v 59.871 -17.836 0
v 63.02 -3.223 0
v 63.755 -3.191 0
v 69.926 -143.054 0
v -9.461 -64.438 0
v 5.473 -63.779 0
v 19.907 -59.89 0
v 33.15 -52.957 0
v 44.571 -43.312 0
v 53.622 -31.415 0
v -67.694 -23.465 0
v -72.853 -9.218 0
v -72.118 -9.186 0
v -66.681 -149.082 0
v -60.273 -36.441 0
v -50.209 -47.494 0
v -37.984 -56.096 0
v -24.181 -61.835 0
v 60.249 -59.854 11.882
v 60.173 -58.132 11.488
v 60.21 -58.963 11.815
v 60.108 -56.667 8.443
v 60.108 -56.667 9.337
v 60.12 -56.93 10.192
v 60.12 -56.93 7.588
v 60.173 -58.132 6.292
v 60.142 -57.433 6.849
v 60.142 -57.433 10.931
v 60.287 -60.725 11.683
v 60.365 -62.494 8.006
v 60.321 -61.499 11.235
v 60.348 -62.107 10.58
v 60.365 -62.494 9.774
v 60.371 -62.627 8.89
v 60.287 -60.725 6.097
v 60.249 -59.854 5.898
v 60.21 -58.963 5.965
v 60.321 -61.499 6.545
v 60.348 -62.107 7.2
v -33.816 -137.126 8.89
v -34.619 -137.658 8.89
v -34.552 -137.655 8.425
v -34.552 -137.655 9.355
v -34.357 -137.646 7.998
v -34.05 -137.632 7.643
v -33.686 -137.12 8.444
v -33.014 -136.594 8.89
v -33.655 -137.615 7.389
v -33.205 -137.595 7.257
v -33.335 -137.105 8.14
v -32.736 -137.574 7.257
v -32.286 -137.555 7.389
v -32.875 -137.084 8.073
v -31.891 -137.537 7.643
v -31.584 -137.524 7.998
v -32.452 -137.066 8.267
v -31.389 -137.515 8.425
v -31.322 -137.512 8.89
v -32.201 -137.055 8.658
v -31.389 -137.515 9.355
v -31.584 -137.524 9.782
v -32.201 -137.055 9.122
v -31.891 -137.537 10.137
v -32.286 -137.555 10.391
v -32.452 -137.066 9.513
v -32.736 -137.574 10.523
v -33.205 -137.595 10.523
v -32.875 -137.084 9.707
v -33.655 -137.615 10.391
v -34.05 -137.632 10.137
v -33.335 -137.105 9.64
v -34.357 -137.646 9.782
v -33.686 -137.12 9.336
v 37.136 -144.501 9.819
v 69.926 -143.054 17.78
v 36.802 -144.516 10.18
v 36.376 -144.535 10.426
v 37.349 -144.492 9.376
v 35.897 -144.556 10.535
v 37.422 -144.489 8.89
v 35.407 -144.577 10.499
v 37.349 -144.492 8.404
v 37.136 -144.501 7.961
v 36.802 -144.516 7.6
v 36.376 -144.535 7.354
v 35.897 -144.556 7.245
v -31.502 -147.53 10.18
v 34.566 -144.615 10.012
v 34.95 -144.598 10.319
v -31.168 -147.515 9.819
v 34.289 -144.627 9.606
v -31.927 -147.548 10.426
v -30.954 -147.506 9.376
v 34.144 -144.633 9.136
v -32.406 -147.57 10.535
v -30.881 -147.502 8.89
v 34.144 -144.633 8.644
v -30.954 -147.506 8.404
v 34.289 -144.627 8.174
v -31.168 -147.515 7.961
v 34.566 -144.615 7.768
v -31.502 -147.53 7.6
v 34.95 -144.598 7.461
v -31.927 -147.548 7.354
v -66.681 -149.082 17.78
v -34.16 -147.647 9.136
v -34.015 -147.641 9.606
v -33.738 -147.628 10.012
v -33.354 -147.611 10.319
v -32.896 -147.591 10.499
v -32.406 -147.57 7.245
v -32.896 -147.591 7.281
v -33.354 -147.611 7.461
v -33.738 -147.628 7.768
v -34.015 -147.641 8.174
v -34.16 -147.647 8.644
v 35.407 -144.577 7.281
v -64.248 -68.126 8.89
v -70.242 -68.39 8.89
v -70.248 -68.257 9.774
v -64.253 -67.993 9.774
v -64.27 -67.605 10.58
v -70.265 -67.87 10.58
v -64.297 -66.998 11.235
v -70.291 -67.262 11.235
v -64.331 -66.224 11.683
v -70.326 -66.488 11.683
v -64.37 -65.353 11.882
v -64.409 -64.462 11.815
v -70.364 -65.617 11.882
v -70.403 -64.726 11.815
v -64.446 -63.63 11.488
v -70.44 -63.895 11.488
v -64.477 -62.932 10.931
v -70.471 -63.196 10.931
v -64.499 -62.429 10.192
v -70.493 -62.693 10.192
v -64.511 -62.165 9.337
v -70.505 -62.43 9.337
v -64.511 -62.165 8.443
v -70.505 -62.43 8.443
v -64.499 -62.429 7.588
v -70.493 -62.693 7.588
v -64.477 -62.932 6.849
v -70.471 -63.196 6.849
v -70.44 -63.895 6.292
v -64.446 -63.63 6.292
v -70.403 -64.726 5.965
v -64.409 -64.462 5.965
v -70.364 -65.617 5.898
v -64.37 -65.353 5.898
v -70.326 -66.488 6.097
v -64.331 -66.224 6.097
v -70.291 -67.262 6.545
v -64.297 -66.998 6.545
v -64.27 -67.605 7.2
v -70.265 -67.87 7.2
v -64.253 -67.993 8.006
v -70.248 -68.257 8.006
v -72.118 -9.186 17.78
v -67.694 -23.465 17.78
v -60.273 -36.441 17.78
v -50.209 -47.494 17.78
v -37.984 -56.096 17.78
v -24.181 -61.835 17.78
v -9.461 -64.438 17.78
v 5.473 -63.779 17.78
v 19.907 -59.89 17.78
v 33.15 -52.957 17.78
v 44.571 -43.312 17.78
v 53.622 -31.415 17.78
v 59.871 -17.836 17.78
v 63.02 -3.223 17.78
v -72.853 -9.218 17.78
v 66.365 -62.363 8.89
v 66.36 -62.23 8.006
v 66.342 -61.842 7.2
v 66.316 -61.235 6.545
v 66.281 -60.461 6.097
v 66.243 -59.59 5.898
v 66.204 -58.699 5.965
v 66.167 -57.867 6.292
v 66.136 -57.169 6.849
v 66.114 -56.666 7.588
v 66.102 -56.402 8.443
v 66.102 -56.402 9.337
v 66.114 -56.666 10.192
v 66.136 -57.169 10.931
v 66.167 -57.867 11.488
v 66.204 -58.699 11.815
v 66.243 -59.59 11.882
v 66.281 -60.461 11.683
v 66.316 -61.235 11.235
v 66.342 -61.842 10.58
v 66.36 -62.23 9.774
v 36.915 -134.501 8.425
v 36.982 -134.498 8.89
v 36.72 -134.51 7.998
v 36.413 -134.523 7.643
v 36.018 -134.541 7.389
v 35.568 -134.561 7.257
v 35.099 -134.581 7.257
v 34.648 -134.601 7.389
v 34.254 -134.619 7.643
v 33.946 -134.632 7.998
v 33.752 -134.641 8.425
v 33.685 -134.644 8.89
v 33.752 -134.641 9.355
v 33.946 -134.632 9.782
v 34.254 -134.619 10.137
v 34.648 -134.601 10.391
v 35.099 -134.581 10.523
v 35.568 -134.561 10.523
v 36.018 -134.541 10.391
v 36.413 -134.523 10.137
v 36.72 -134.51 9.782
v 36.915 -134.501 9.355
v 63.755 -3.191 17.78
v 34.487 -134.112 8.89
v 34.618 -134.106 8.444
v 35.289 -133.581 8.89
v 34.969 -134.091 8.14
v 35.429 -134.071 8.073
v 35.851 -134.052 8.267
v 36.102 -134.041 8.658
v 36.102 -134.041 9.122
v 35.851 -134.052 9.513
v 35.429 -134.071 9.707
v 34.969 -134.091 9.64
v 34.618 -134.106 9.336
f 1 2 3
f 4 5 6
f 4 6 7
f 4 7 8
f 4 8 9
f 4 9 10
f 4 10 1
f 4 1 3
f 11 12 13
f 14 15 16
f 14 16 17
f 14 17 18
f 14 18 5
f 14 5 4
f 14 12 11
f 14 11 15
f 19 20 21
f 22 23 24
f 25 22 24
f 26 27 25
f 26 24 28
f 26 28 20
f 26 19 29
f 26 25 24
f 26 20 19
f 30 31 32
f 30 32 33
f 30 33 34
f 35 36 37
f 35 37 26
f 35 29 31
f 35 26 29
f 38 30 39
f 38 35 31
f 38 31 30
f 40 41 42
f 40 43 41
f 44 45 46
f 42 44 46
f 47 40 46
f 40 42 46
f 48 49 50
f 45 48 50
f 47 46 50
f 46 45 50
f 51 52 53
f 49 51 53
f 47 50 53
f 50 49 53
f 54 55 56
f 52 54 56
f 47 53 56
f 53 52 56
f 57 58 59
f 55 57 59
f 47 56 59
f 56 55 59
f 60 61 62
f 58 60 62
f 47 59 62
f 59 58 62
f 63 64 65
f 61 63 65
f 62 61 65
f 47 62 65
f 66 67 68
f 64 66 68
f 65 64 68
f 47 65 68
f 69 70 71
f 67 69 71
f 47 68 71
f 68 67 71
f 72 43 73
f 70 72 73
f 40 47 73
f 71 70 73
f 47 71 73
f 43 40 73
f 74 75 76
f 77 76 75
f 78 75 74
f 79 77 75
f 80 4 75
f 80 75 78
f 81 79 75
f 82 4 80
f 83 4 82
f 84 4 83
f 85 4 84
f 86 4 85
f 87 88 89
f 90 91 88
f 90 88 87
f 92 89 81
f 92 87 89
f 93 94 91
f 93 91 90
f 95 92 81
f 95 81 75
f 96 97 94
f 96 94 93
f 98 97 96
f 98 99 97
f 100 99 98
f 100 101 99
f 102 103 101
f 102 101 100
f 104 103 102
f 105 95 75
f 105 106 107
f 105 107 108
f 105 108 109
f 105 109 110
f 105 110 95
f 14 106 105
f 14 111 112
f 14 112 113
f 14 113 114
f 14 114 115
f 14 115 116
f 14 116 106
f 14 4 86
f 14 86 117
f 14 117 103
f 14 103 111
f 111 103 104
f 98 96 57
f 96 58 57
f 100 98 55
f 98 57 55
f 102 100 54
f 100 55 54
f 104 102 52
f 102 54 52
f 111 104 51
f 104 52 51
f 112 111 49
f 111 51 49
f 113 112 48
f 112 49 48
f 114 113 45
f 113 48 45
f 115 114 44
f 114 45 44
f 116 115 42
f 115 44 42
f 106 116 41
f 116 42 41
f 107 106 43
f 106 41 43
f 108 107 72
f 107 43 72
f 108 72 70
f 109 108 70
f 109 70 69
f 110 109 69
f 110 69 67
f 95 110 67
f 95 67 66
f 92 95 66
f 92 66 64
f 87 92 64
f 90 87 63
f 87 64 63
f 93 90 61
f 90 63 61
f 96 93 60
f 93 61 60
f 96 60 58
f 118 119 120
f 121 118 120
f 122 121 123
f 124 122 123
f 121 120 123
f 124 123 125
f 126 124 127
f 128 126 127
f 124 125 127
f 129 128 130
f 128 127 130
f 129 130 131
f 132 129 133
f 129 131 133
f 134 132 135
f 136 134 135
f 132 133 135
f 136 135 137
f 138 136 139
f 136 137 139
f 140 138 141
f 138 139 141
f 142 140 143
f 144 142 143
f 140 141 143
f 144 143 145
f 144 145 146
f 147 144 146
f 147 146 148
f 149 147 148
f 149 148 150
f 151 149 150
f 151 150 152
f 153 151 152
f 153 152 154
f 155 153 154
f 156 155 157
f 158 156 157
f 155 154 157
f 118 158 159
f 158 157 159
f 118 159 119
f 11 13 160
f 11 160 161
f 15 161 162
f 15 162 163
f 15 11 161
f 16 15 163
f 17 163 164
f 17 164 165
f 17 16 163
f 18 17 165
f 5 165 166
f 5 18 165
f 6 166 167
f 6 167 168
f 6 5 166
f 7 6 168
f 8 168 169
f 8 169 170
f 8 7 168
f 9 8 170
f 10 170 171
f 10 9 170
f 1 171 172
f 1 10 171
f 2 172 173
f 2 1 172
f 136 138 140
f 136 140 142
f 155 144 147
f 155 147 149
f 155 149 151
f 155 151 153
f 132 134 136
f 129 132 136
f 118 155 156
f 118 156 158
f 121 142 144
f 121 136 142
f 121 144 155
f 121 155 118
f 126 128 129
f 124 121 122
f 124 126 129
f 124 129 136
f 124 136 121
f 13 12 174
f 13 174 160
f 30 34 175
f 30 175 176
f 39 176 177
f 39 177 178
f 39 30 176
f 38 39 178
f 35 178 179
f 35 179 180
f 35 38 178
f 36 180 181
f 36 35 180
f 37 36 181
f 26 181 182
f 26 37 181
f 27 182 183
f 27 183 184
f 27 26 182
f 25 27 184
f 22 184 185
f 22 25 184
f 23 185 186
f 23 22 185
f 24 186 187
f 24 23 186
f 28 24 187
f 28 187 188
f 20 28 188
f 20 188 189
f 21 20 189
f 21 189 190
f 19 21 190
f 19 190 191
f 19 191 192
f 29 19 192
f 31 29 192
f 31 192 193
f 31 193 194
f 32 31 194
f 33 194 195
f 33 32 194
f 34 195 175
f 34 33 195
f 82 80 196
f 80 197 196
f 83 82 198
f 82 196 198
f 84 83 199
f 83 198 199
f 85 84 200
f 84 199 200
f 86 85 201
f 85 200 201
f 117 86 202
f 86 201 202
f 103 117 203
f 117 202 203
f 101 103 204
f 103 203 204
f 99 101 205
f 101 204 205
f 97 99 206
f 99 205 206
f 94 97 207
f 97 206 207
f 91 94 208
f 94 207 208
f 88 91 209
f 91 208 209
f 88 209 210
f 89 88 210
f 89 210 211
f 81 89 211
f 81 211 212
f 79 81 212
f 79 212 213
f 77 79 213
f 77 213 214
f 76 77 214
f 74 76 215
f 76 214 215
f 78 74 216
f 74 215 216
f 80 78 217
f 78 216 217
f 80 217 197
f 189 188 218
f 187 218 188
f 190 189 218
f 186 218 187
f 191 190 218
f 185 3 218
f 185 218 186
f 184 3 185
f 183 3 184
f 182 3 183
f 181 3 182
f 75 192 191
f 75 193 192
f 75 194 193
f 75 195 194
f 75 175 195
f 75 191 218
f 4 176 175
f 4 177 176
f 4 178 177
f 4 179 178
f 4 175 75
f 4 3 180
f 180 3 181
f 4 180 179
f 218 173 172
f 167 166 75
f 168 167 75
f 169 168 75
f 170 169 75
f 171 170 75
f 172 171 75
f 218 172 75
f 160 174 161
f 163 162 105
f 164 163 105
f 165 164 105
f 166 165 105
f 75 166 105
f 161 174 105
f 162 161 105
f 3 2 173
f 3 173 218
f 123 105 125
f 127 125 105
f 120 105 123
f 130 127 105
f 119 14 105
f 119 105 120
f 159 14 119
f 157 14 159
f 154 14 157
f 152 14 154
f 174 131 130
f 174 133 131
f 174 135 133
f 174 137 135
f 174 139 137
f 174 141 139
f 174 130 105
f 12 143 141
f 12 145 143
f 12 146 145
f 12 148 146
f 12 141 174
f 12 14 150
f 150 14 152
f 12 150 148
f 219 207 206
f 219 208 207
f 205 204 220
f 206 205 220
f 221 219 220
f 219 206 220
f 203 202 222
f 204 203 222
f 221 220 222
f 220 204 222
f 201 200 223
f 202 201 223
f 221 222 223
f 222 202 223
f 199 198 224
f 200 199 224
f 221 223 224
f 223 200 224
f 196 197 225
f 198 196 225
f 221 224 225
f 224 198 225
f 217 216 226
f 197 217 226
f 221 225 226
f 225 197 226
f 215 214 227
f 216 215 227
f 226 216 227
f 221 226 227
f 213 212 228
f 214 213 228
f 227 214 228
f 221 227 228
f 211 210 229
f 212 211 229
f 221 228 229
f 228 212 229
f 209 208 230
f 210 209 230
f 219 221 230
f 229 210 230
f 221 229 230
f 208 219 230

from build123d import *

# Parameters (mm, degrees)
BOSS_EXTRUDE1_DEPTH                       = 17.78
SKETCH3_R                                 = 3
CUT_EXTRUDE3_DEPTH                        = 6
CUT_EXTRUDE4_START                        = -6
SKETCH4_R                                 = 3
CUT_EXTRUDE4_DEPTH                        = 6
TAP_DRILL_FOR_M4X0_7_TAP1_D               = 3.3
TAP_DRILL_FOR_M4X0_7_TAP1_DEPTH           = 10
TAP_DRILL_FOR_M4X0_7_TAP1_TIP             = 0.991420021
TAP_DRILL_FOR_M4X0_7_TAP1_ON_FACE_2_D     = 3.3
TAP_DRILL_FOR_M4X0_7_TAP1_ON_FACE_2_DEPTH = 10
TAP_DRILL_FOR_M4X0_7_TAP1_ON_FACE_2_TIP   = 0.991420021


with BuildPart() as part:
    # Sketch1 → Boss-Extrude1 (new body)
    with BuildSketch(Plane(origin=(0, 0, 0), x_dir=(-0.044080076933776656, 0.9990280010177455, 0), z_dir=(0, 0, 1))):
        with BuildLine():
            Line((-5.997717637, -62.816664904), (-5.997717637, -63.551933441))
            Line((-5.997717637, -63.551933441), (-145.997717637, -63.551933441))
            Line((-145.997717637, -63.551933441), (-145.997717637, 73.188066556))
            Line((-145.997717637, 73.188066556), (-5.997717637, 73.188066556))
            Line((-5.997717637, 73.188066556), (-5.997717637, 72.452798018))
            ThreePointArc((-5.997717637, 72.452798018), (-64.367717636, 4.818066557), (-5.997717637, -62.816664904))
        make_face()
    extrude(amount=BOSS_EXTRUDE1_DEPTH)

    # Sketch3 → Cut-Extrude3 (cut)
    with BuildSketch(Plane(origin=(-73.116927829, -3.226135604, 0), x_dir=(0, 0, 1), z_dir=(-0.9990280010177455, -0.044080076933776635, 0))):
        with Locations(Location((8.89, -62.227710676, 0), (0, 0, 270))):
            Circle(SKETCH3_R)
    extrude(amount=-CUT_EXTRUDE3_DEPTH, mode=Mode.SUBTRACT)

    # Sketch4 → Cut-Extrude4 (cut)
    with BuildSketch(Plane(origin=(63.490161027, 2.801374115, 0), x_dir=(0, 0, -1), z_dir=(0.9990280010177455, 0.044080076933776635, 0)).offset(CUT_EXTRUDE4_START)):
        with Locations(Location((-8.89, -62.227710676, 0), (0, 0, 270))):
            Circle(SKETCH4_R)
    extrude(amount=CUT_EXTRUDE4_DEPTH, mode=Mode.SUBTRACT)

    # Tap Drill for M4x0.7 Tap1
    with Locations(Plane(origin=(-32.52956499, -147.575066179, 8.89), x_dir=(-0.999028001018, -0.044080076934, 0), z_dir=(0.044080076934, -0.999028001018, 0))):
        with Locations((0, 0)):
            Hole(TAP_DRILL_FOR_M4X0_7_TAP1_D / 2, depth=TAP_DRILL_FOR_M4X0_7_TAP1_DEPTH)
            with Locations((0, 0, -(TAP_DRILL_FOR_M4X0_7_TAP1_DEPTH + TAP_DRILL_FOR_M4X0_7_TAP1_TIP / 2))):  # 118° drill point
                Cone(0, TAP_DRILL_FOR_M4X0_7_TAP1_D / 2, TAP_DRILL_FOR_M4X0_7_TAP1_TIP, mode=Mode.SUBTRACT)

    # Tap Drill for M4x0.7 Tap1 on face 2
    with Locations(Plane(origin=(35.773979438, -144.561311319, 8.89), x_dir=(-0.999028004404, -0.044080000194, 0), z_dir=(0.044080000194, -0.999028004404, 0))):
        with Locations((0, 0)):
            Hole(TAP_DRILL_FOR_M4X0_7_TAP1_ON_FACE_2_D / 2, depth=TAP_DRILL_FOR_M4X0_7_TAP1_ON_FACE_2_DEPTH)
            with Locations((0, 0, -(TAP_DRILL_FOR_M4X0_7_TAP1_ON_FACE_2_DEPTH + TAP_DRILL_FOR_M4X0_7_TAP1_ON_FACE_2_TIP / 2))):  # 118° drill point
                Cone(0, TAP_DRILL_FOR_M4X0_7_TAP1_ON_FACE_2_D / 2, TAP_DRILL_FOR_M4X0_7_TAP1_ON_FACE_2_TIP, mode=Mode.SUBTRACT)


solid = part.part
